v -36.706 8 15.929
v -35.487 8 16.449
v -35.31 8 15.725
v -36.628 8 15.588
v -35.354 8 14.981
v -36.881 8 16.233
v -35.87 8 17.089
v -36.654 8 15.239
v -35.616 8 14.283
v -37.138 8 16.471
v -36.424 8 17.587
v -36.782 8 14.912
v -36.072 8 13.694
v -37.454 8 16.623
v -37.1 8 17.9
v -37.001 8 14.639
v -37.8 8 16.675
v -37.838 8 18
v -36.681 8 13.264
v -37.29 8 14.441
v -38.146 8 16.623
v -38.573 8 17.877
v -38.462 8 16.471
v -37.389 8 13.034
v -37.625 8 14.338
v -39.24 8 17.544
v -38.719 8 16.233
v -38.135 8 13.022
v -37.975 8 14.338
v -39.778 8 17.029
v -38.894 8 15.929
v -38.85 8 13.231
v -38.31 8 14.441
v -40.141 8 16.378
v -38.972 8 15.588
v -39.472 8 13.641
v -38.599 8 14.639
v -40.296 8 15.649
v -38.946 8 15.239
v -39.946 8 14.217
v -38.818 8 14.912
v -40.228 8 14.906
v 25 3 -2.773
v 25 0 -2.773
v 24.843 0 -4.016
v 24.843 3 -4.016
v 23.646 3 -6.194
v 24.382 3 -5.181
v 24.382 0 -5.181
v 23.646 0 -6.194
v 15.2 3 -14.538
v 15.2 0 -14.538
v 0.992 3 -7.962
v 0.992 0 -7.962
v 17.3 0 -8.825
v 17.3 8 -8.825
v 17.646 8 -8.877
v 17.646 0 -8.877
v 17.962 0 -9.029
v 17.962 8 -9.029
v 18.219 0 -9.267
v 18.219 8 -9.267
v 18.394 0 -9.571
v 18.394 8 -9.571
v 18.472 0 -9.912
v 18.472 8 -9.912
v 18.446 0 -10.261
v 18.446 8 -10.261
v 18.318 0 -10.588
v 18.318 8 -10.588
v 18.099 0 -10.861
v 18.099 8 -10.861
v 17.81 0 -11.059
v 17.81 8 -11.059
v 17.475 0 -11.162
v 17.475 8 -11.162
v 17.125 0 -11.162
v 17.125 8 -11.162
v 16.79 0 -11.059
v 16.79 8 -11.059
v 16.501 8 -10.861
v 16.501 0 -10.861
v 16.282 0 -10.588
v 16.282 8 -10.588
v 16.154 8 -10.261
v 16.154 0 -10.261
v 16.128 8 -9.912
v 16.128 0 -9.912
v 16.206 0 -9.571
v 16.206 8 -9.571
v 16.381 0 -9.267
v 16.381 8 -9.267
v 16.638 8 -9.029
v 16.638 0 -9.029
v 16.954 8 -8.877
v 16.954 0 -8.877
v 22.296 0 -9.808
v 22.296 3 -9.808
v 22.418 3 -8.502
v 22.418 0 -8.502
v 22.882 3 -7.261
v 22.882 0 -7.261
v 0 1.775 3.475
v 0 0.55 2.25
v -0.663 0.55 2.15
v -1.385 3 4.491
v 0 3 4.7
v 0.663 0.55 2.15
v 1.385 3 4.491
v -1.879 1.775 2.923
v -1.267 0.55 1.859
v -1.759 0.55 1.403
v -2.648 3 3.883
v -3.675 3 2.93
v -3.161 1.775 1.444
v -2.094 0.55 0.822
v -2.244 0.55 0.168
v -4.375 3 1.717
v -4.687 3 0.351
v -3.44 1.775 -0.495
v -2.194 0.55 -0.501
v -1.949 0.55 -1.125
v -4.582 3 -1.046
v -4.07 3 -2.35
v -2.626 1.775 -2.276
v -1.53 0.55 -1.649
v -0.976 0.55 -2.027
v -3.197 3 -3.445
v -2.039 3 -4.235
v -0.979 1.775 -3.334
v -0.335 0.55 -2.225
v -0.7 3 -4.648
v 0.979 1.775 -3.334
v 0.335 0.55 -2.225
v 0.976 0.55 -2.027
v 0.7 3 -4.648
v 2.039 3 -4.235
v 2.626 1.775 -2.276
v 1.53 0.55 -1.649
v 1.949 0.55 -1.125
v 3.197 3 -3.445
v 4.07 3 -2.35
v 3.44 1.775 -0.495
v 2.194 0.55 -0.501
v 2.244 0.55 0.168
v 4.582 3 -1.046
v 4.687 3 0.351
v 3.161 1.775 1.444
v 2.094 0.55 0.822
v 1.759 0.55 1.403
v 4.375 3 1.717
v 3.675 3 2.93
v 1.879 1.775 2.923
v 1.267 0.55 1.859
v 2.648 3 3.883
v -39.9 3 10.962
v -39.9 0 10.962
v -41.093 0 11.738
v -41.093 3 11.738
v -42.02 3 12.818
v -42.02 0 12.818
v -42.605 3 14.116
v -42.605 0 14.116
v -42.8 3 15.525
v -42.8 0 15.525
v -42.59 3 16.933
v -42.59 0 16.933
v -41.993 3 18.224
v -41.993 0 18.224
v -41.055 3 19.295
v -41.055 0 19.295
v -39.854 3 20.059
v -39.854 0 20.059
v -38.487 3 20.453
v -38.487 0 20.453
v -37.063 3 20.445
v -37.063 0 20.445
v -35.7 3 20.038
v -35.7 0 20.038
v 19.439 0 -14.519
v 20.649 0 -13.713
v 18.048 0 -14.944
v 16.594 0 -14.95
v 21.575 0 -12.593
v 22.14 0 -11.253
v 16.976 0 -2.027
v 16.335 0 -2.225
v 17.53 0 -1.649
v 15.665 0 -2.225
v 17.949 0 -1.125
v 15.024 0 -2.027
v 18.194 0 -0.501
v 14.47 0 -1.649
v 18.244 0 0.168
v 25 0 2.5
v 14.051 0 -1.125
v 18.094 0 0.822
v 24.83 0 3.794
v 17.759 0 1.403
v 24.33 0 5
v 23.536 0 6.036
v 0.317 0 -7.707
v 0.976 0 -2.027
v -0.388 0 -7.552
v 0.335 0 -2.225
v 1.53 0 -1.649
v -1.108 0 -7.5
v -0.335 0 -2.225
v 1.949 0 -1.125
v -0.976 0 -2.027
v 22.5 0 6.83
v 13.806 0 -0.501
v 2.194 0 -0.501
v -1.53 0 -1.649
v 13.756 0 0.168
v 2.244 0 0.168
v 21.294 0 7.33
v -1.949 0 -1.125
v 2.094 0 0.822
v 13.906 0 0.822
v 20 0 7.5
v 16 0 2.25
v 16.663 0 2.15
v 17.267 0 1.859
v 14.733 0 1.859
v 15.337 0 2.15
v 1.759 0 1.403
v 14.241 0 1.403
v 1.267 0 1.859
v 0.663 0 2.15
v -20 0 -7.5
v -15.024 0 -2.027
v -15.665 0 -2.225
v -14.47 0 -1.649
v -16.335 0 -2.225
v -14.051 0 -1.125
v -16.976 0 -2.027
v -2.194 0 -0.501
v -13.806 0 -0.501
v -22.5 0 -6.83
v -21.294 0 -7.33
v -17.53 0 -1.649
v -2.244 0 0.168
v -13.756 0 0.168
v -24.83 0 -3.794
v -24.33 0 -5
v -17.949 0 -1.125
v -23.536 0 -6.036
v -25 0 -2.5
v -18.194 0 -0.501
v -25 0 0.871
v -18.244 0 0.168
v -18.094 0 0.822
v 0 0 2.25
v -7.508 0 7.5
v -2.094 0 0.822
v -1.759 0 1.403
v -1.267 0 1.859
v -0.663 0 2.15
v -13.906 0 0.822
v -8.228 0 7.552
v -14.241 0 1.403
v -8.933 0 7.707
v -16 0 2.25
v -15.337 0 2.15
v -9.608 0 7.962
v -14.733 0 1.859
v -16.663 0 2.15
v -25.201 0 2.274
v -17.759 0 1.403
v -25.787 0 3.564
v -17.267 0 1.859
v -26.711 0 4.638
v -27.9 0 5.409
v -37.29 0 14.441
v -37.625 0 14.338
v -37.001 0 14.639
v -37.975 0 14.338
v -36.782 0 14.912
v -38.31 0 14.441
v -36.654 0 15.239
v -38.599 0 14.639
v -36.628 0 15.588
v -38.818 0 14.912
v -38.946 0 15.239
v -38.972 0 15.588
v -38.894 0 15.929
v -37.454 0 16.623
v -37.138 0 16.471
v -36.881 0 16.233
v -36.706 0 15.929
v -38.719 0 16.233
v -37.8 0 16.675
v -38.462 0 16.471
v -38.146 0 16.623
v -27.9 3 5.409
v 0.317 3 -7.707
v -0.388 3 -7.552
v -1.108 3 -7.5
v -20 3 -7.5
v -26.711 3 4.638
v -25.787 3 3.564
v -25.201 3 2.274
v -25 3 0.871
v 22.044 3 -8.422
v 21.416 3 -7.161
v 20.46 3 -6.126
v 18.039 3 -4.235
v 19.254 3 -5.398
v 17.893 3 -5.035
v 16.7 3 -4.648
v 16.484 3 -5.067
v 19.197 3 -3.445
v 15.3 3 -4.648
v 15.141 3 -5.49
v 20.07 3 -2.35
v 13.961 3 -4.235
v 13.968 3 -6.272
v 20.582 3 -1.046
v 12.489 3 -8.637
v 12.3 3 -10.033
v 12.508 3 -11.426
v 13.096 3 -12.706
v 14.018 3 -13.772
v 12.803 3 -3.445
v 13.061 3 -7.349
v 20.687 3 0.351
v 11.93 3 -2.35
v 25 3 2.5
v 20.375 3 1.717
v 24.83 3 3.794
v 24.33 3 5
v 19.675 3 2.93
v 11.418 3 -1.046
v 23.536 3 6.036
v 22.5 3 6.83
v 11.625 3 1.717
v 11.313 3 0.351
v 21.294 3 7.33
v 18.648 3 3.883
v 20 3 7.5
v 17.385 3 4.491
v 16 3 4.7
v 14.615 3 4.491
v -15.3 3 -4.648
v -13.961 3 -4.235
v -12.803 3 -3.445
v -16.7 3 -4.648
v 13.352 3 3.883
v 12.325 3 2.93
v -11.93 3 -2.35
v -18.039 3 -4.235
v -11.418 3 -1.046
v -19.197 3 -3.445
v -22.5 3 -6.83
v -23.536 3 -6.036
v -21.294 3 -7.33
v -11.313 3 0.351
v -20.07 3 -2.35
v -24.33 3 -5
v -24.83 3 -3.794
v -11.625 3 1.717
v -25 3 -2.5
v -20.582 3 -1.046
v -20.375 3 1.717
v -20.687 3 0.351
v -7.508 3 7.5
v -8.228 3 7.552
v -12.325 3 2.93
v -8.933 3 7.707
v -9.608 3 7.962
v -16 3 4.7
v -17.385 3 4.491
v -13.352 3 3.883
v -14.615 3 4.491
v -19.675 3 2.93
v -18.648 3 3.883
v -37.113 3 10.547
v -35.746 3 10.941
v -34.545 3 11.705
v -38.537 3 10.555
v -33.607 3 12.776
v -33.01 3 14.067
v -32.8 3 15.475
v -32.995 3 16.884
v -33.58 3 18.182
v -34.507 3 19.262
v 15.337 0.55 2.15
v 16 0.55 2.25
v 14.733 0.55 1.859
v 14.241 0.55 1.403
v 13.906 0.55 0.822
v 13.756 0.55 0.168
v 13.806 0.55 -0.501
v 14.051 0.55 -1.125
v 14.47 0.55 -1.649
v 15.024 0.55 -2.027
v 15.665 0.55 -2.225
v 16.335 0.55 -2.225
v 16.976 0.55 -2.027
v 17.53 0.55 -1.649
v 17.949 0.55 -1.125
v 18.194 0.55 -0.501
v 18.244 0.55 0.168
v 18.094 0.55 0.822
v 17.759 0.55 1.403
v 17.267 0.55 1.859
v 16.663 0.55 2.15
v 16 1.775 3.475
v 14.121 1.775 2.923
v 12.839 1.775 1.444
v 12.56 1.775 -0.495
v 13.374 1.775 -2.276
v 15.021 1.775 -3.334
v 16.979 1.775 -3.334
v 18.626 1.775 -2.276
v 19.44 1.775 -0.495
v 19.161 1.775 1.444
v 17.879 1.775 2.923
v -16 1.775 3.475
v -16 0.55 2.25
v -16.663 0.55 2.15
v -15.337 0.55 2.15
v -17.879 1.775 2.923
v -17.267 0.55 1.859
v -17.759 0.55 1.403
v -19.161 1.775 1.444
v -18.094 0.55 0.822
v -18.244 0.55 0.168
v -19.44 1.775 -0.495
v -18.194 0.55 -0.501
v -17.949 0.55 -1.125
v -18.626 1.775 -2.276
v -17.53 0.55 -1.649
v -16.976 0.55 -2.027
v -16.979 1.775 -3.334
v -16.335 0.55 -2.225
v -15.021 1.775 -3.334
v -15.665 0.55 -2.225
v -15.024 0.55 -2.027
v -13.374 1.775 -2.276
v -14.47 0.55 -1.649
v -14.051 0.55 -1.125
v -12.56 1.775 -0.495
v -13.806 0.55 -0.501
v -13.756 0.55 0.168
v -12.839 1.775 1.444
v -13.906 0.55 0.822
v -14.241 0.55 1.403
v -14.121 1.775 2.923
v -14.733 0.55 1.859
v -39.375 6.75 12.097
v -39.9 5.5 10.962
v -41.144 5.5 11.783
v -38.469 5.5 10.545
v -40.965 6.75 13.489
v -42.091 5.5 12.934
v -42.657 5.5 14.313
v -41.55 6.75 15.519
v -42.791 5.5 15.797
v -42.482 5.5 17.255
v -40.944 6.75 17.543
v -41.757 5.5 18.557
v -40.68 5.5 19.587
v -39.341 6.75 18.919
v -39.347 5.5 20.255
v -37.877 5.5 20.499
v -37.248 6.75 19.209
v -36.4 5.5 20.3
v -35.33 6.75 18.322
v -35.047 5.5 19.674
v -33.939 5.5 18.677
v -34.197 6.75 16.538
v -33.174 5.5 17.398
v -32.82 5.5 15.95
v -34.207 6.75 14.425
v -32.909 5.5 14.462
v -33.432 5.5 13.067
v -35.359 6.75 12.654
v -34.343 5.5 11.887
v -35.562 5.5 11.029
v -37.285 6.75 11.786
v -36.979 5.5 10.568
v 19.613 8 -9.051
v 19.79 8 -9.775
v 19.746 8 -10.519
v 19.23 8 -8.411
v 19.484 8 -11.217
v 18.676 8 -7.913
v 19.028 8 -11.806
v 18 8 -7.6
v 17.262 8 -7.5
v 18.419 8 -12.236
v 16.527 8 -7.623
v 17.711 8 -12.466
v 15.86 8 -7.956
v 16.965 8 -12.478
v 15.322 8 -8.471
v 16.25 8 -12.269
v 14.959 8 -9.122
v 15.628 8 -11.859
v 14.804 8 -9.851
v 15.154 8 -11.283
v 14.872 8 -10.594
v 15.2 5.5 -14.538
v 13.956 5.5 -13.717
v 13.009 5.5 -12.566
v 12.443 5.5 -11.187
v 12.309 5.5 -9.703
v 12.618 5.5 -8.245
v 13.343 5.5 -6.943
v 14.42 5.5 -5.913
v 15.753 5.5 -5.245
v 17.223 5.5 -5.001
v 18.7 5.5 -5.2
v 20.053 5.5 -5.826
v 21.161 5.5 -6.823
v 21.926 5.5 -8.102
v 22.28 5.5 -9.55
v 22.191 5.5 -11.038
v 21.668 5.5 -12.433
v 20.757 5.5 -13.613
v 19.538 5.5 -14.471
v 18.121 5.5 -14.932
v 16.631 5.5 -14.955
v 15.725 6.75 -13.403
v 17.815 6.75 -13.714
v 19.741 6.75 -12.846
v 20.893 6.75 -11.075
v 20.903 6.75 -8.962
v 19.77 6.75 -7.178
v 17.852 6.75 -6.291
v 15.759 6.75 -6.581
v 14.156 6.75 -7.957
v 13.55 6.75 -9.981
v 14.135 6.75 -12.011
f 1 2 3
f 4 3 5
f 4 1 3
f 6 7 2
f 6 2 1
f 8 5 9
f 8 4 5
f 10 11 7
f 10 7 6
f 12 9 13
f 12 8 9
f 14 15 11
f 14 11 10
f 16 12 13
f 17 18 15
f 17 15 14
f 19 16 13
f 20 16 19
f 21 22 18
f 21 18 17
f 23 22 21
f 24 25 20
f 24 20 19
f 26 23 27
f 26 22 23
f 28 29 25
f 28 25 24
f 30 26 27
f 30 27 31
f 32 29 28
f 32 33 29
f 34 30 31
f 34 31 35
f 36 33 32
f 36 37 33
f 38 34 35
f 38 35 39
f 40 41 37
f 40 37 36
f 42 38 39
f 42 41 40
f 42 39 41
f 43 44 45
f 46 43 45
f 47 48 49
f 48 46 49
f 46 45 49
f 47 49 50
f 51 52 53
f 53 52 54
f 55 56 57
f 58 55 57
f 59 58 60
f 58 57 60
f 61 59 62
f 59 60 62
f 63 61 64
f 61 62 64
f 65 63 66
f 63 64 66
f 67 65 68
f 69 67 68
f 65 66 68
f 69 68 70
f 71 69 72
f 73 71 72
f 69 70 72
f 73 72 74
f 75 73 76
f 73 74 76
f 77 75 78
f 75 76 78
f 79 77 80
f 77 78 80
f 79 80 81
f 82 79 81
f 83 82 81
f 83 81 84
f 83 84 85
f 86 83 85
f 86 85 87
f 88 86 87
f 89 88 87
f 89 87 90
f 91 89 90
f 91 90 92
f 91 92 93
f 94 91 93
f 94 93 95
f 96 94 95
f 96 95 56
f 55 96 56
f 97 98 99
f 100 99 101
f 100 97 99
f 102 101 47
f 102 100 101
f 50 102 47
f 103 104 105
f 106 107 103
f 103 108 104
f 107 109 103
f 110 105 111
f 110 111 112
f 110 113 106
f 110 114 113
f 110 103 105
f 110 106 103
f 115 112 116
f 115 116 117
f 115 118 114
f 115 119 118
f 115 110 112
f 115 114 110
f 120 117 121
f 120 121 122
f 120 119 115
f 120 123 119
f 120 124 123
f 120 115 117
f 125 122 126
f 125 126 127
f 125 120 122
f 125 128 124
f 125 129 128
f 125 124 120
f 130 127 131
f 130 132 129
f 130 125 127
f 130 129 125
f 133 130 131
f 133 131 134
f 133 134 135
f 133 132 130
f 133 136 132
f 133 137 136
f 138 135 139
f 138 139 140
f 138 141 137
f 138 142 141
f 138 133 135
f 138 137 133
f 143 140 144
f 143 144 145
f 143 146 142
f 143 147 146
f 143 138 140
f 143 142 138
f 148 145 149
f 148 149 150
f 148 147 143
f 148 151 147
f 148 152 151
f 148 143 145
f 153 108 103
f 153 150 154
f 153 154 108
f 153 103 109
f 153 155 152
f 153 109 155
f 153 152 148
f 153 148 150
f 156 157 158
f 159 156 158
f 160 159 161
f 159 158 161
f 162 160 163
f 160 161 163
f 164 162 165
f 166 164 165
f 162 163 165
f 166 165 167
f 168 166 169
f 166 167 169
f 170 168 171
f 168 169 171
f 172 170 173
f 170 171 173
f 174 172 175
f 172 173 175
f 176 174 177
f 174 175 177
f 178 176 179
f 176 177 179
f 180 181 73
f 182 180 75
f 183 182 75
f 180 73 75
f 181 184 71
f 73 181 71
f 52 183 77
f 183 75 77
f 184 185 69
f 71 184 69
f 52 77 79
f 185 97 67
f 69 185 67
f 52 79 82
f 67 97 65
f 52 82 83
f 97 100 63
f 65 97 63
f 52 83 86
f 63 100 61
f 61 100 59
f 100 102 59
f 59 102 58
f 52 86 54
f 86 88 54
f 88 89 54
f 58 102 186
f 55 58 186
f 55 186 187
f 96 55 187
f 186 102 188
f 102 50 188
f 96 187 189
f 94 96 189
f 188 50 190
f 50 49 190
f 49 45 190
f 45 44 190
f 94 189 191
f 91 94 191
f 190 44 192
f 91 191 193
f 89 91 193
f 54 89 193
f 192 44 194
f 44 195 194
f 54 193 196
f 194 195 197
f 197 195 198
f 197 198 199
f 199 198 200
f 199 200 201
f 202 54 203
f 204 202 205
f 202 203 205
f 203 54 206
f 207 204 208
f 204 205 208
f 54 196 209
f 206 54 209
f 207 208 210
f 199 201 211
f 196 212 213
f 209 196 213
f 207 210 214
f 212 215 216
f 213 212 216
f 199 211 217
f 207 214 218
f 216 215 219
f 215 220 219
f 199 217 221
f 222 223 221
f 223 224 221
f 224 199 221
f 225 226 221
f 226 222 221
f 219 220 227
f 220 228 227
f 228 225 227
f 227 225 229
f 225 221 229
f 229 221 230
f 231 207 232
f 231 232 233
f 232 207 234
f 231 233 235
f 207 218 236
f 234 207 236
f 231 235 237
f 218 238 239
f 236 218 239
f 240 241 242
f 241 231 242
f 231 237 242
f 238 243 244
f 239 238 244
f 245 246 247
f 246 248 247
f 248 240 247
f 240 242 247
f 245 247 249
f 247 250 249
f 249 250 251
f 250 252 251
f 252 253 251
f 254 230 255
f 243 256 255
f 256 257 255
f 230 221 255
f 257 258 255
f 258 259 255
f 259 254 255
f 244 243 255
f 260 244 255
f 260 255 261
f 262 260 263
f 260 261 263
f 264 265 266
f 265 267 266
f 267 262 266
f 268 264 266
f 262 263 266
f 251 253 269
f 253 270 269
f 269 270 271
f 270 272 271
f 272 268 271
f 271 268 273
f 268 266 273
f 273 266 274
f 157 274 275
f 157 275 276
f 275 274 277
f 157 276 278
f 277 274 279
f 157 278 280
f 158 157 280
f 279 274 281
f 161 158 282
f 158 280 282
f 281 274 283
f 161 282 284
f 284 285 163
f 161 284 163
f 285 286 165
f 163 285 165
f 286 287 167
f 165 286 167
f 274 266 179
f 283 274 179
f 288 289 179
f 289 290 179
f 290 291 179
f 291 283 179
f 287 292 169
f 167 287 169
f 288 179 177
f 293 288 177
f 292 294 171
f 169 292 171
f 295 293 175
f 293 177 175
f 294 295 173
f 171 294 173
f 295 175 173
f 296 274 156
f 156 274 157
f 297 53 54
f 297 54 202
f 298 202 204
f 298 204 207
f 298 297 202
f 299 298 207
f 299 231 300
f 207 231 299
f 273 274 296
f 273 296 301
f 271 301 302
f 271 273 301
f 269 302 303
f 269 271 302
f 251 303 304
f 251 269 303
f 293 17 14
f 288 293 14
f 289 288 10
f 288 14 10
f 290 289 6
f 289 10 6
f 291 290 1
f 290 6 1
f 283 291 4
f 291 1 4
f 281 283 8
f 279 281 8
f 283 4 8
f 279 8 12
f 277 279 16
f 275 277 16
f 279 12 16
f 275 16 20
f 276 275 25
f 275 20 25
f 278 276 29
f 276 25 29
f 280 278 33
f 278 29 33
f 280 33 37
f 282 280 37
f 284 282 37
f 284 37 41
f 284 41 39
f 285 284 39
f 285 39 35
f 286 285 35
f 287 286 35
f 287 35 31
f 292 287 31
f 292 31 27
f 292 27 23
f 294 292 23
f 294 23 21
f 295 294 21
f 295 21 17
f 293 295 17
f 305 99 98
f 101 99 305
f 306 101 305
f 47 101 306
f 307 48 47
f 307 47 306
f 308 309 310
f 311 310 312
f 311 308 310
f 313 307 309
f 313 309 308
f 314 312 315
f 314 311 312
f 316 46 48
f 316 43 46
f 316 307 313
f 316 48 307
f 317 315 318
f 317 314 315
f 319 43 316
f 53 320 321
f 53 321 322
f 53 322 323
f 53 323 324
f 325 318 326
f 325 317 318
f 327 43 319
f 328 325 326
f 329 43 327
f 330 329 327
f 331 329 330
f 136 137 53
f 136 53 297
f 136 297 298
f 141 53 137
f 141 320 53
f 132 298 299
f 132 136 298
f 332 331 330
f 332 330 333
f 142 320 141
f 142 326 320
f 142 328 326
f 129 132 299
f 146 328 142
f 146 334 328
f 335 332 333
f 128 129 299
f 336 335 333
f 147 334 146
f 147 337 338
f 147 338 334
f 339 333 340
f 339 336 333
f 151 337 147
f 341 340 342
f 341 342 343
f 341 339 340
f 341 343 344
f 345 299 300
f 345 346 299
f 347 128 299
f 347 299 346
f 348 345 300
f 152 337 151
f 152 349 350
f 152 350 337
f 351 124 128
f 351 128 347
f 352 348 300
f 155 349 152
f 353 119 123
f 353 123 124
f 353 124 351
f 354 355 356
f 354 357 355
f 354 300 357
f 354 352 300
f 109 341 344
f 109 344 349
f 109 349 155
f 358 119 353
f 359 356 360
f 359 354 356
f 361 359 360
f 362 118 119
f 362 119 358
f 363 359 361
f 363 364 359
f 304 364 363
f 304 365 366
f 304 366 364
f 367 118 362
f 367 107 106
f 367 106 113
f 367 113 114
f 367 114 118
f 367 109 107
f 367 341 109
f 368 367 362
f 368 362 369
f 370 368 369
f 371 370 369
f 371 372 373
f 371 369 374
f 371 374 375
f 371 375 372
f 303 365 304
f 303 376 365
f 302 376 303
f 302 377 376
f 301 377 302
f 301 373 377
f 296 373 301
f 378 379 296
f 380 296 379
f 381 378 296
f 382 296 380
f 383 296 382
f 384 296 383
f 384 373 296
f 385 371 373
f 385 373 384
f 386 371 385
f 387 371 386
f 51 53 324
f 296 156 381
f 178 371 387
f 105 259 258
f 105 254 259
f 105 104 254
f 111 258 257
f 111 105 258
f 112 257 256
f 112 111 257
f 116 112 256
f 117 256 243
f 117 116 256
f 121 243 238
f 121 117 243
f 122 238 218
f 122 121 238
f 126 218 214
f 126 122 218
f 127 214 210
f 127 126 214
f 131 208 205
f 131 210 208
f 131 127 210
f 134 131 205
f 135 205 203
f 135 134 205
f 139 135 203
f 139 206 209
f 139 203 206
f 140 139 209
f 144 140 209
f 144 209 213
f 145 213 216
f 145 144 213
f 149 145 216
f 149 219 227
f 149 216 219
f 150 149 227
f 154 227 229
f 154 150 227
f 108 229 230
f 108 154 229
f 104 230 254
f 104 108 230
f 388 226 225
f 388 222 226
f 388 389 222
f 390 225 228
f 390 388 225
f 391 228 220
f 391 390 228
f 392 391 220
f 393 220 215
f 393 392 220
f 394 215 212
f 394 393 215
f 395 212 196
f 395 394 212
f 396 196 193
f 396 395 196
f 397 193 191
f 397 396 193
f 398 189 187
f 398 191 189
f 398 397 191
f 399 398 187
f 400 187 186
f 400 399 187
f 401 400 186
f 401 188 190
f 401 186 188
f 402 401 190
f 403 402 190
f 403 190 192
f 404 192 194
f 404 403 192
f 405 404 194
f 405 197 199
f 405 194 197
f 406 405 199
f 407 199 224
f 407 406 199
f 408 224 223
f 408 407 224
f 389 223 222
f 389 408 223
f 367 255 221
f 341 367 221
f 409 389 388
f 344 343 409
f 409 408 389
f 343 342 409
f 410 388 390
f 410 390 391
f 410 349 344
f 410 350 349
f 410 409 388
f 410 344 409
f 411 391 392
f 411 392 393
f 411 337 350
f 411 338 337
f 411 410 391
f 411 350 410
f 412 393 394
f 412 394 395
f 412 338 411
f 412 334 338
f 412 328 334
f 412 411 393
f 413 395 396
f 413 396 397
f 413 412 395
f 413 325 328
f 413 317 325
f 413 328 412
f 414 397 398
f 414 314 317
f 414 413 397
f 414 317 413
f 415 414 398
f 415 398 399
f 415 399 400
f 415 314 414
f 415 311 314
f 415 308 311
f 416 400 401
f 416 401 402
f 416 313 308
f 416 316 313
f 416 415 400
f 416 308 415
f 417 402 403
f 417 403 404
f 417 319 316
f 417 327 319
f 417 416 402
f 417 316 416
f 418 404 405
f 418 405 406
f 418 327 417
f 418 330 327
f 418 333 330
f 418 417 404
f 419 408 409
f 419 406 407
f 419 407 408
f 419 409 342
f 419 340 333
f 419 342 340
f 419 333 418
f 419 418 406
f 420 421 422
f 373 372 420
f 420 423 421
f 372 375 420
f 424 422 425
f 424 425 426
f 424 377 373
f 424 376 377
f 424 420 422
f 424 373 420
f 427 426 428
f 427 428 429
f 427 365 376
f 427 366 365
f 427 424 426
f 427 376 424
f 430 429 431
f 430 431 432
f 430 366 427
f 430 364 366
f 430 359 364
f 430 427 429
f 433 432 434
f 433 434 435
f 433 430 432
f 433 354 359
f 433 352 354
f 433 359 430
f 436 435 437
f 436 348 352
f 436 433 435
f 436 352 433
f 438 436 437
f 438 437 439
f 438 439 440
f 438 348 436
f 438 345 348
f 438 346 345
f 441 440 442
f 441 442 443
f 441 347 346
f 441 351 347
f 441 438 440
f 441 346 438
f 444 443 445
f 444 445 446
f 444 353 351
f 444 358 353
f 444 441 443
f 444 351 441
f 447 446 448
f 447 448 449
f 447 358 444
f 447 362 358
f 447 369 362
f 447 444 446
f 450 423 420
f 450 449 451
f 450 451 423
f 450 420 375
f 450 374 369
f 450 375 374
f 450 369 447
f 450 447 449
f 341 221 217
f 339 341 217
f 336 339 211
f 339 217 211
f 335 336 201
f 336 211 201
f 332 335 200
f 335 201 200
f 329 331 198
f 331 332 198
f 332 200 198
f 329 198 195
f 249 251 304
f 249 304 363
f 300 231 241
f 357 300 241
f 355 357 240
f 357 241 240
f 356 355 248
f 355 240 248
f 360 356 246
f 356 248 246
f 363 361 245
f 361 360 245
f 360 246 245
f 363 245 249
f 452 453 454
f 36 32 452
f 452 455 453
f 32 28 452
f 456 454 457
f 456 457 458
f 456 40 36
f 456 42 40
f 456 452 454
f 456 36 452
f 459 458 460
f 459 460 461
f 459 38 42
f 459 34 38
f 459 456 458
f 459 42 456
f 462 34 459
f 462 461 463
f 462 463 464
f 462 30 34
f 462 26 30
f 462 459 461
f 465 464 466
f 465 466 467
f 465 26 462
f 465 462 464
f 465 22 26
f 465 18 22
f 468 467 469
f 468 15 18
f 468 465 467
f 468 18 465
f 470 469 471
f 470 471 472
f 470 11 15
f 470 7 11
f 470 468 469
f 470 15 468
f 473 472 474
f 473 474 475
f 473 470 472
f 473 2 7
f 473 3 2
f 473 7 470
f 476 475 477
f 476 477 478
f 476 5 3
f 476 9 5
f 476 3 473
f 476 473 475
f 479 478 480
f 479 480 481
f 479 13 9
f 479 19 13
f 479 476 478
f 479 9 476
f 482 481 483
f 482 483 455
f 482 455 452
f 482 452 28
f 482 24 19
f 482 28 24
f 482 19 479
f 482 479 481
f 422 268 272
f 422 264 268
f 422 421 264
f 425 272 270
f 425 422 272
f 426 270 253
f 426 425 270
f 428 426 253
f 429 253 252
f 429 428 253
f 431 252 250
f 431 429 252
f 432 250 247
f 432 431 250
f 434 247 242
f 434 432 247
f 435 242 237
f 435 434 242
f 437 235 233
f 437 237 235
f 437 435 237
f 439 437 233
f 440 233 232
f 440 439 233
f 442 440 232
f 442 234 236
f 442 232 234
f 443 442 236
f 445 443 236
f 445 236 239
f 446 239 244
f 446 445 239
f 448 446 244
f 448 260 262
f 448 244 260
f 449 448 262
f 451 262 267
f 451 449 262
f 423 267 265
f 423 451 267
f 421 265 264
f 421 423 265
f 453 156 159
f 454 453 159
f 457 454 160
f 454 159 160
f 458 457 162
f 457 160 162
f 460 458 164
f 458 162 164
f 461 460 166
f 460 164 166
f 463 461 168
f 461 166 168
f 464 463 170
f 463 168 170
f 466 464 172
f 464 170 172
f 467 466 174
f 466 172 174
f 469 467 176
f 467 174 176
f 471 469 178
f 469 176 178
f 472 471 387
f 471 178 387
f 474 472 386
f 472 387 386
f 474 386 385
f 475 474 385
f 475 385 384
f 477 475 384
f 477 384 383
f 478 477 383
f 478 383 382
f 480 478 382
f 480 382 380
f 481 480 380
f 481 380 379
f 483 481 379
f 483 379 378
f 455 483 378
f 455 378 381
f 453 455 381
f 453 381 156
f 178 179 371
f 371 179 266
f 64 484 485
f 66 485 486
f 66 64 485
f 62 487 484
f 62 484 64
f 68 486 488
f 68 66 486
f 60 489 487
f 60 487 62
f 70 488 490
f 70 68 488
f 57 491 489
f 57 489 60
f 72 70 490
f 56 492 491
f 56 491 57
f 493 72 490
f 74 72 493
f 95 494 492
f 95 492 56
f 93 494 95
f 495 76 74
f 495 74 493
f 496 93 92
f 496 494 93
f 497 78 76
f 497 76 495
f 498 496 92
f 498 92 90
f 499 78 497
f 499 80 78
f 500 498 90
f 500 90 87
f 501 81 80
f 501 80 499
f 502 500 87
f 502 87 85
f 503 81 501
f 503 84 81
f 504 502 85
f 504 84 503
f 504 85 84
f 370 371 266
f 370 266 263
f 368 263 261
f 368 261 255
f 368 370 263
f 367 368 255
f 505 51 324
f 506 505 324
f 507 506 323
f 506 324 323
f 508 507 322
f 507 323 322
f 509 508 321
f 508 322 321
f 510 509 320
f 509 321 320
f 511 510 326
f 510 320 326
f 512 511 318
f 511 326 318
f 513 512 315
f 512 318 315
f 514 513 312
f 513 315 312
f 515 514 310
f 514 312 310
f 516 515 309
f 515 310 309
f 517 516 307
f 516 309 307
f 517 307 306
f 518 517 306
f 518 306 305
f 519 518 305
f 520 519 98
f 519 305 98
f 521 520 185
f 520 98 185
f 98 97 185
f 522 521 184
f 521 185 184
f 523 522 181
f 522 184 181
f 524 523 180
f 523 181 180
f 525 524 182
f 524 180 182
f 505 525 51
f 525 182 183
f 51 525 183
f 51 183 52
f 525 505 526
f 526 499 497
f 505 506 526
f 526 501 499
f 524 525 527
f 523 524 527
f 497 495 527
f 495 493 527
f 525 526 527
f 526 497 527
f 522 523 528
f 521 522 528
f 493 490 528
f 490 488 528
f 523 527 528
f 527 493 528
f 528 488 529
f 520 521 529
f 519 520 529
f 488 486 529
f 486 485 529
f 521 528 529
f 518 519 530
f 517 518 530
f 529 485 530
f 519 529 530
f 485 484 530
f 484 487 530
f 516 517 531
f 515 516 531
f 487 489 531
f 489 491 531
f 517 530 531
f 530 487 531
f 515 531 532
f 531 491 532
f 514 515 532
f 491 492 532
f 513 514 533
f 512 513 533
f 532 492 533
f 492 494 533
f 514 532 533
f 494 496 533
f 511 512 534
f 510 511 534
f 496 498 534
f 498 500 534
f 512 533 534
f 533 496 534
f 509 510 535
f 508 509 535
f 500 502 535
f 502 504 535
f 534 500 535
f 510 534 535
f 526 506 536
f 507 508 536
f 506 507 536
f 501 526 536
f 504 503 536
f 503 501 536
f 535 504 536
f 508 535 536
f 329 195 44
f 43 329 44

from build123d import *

# Parameters (mm, degrees)
BOSS_EXTRUDE2_DEPTH                          = 3
SKETCH4_W                                    = 50
SKETCH4_H                                    = 15
BOSS_EXTRUDE3_DEPTH                          = 3
SKETCH6_R                                    = 5
BOSS_EXTRUDE4_DEPTH                          = 5
FILLET1_R                                    = 5
FILLET2_R                                    = 5
CSK_FOR_M4_COUNTERSUNK_FLAT_HEAD_SCR_2_COUNT = 2
CSK_FOR_M4_COUNTERSUNK_FLAT_HEAD_SCR_2_PITCH = 16
CSK_FOR_M4_COUNTERSUNK_FLAT_HEAD_SCR_3_COUNT = 2
CSK_FOR_M4_COUNTERSUNK_FLAT_HEAD_SCR_3_PITCH = 16
SKETCH9_R                                    = 1.175
CUT_EXTRUDE2_DEPTH                           = 49.125772869
CHAMFER1_SIZE                                = 2.5


with BuildPart() as part:
    # Sketch2 → Boss-Extrude2 (new body)
    with BuildSketch(Plane(origin=(0, 0, 0), x_dir=(1, 0, 0), z_dir=(0, 1, 0))):
        with BuildLine():
            Line((-35.700010115, -20.037625203), (19.399989885, 5.462374797))
            ThreePointArc((19.399989885, 5.462374797), (21.837625203, 12.099989885), (15.200010115, 14.537625203))
            Line((15.200010115, 14.537625203), (-39.899989885, -10.962374797))
            ThreePointArc((-39.899989885, -10.962374797), (-42.337625203, -17.599989885), (-35.700010115, -20.037625203))
        make_face()
    extrude(amount=BOSS_EXTRUDE2_DEPTH)

    # Sketch4 → Boss-Extrude3 (add)
    with BuildSketch(Plane(origin=(0, 0, 0), x_dir=(1, 0, 0), z_dir=(0, 1, 0))):
        Rectangle(SKETCH4_W, SKETCH4_H)
    extrude(amount=BOSS_EXTRUDE3_DEPTH)

    # Sketch6 → Boss-Extrude4 (add)
    with BuildSketch(Plane(origin=(0, 3, 0), x_dir=(1, 0, 0), z_dir=(0, 1, 0))):
        with Locations(Location((-37.8, -15.5, 0), (0, 0, 114.834459772))):
            Circle(SKETCH6_R)
        with Locations(Location((17.3, 10, 0), (0, 0, 114.834459772))):
            Circle(SKETCH6_R)
    extrude(amount=BOSS_EXTRUDE4_DEPTH)

    # Fillet1
    # the kernel refuses this fillet: 5 mm, written as the material it adds along each edge
    with BuildSketch(Plane(origin=(-25, 0, 4.066735195), x_dir=(0, 0, -1), z_dir=(0, 1, 0))) as fillet1_piece_1:
        with BuildLine():
            CenterArc((FILLET1_R * 0.639103051734, FILLET1_R), FILLET1_R, 204.834459772, 65.165540228)
            Line((-FILLET1_R * 0.268421988848, FILLET1_R * 0.580002022961), (0, 0))
            Line((0, 0), (FILLET1_R * 0.639103051734, 0))
        make_face()
    extrude(amount=3)
    with BuildSketch(Plane(origin=(-0.00678003, 3, -7.5), x_dir=(0.9075250405819563, 0, -0.419997977038841), z_dir=(0, -1, 0)), Plane(origin=(-8.608906245, 3, 7.5), x_dir=(-0.9075250405819576, 0, 0.41999797703883784), z_dir=(0, -1, 0))) as fillet1_piece_2:
        with BuildLine():
            CenterArc((FILLET1_R * 0.220179535316, -FILLET1_R), FILLET1_R, 90, 24.834459772)
            Line((-FILLET1_R * 0.199818441723, -FILLET1_R * 0.092474959418), (0, 0))
            Line((0, 0), (FILLET1_R * 0.220179535316, 0))
        make_face()
    extrude(amount=3)
    # the kernel refuses this fillet: 5 mm, written as the material it takes off along each edge
    with BuildSketch(Plane(origin=(25, -11.817012604, -7.5), x_dir=(0, 0, 1), z_dir=(0, 1, 0))) as fillet1_2_piece_1:
        with BuildLine():
            CenterArc((4.726805042, -5), FILLET1_R, 90, 70.972289662)
            Line((0, -3.369872981), (0, 0))
            Line((0, 0), (4.726805042, 0))
        make_face()
    extrude(amount=26.634025208, mode=Mode.SUBTRACT)
    with BuildSketch(Plane(origin=(-25, -12.5, -7.5), x_dir=(1, 0, 0), z_dir=(0, 1, 0)), Plane(origin=(25, -12.5, 7.5), x_dir=(-1, 0, 0), z_dir=(0, 1, 0))) as fillet1_2_piece_2:
        with BuildLine():
            CenterArc((FILLET1_R, -FILLET1_R), FILLET1_R, 90, 90)
            Line((0, -FILLET1_R), (0, 0))
            Line((0, 0), (FILLET1_R, 0))
        make_face()
    extrude(amount=28, mode=Mode.SUBTRACT)

    # Fillet2
    fillet2_edges = [part.edges().sort_by_distance(p)[0] for p in [
        (21.630127019, 1.5, -7.5),
    ]]
    fillet(fillet2_edges, radius=FILLET2_R)

    # Sketch7 → CSK for M4 Countersunk Flat Head Screw1 (revolve, cut)
    with BuildSketch(Plane(origin=(0, 3, 0), x_dir=(0, 0, 1), z_dir=(1, 0, 0))):
        Polygon((0, 0), (0, 3.000025), (2.25, 3.000025), (2.25, 2.45), (4.7, 0), align=None)
    csk_for_m4_countersunk_flat_head_screw1 = revolve(axis=Axis((0, 9.35, 0), (0, -1, 0)), mode=Mode.SUBTRACT)

    # CSK for M4 Countersunk Flat Head Scr 2: CSK for M4 Countersunk Flat Head Screw1 ×2
    with Locations(*[(-i * CSK_FOR_M4_COUNTERSUNK_FLAT_HEAD_SCR_2_PITCH, 0, 0) for i in range(1, CSK_FOR_M4_COUNTERSUNK_FLAT_HEAD_SCR_2_COUNT)]):
        add(csk_for_m4_countersunk_flat_head_screw1, mode=Mode.SUBTRACT)

    # CSK for M4 Countersunk Flat Head Scr 3: CSK for M4 Countersunk Flat Head Screw1 ×2
    with Locations(*[(i * CSK_FOR_M4_COUNTERSUNK_FLAT_HEAD_SCR_3_PITCH, 0, 0) for i in range(1, CSK_FOR_M4_COUNTERSUNK_FLAT_HEAD_SCR_3_COUNT)]):
        add(csk_for_m4_countersunk_flat_head_screw1, mode=Mode.SUBTRACT)

    # Sketch9 → Cut-Extrude2 (cut, through all)
    with BuildSketch(Plane(origin=(0, 8, 0), x_dir=(1, 0, 0), z_dir=(0, 1, 0))):
        with Locations(Location((-37.8, -15.5, 0), (0, 0, 270))):
            Circle(SKETCH9_R)
        with Locations(Location((17.3, 10, 0), (0, 0, 270))):
            Circle(SKETCH9_R)
    extrude(amount=-CUT_EXTRUDE2_DEPTH, mode=Mode.SUBTRACT)

    # Chamfer1
    chamfer1_edges = [part.edges().sort_by_distance(p)[0] for p in [
        (-35.700010115, 8, 20.037625203),
        (19.399989885, 8, -5.462374797),
    ]]
    chamfer(chamfer1_edges, length=CHAMFER1_SIZE)


solid = part.part
